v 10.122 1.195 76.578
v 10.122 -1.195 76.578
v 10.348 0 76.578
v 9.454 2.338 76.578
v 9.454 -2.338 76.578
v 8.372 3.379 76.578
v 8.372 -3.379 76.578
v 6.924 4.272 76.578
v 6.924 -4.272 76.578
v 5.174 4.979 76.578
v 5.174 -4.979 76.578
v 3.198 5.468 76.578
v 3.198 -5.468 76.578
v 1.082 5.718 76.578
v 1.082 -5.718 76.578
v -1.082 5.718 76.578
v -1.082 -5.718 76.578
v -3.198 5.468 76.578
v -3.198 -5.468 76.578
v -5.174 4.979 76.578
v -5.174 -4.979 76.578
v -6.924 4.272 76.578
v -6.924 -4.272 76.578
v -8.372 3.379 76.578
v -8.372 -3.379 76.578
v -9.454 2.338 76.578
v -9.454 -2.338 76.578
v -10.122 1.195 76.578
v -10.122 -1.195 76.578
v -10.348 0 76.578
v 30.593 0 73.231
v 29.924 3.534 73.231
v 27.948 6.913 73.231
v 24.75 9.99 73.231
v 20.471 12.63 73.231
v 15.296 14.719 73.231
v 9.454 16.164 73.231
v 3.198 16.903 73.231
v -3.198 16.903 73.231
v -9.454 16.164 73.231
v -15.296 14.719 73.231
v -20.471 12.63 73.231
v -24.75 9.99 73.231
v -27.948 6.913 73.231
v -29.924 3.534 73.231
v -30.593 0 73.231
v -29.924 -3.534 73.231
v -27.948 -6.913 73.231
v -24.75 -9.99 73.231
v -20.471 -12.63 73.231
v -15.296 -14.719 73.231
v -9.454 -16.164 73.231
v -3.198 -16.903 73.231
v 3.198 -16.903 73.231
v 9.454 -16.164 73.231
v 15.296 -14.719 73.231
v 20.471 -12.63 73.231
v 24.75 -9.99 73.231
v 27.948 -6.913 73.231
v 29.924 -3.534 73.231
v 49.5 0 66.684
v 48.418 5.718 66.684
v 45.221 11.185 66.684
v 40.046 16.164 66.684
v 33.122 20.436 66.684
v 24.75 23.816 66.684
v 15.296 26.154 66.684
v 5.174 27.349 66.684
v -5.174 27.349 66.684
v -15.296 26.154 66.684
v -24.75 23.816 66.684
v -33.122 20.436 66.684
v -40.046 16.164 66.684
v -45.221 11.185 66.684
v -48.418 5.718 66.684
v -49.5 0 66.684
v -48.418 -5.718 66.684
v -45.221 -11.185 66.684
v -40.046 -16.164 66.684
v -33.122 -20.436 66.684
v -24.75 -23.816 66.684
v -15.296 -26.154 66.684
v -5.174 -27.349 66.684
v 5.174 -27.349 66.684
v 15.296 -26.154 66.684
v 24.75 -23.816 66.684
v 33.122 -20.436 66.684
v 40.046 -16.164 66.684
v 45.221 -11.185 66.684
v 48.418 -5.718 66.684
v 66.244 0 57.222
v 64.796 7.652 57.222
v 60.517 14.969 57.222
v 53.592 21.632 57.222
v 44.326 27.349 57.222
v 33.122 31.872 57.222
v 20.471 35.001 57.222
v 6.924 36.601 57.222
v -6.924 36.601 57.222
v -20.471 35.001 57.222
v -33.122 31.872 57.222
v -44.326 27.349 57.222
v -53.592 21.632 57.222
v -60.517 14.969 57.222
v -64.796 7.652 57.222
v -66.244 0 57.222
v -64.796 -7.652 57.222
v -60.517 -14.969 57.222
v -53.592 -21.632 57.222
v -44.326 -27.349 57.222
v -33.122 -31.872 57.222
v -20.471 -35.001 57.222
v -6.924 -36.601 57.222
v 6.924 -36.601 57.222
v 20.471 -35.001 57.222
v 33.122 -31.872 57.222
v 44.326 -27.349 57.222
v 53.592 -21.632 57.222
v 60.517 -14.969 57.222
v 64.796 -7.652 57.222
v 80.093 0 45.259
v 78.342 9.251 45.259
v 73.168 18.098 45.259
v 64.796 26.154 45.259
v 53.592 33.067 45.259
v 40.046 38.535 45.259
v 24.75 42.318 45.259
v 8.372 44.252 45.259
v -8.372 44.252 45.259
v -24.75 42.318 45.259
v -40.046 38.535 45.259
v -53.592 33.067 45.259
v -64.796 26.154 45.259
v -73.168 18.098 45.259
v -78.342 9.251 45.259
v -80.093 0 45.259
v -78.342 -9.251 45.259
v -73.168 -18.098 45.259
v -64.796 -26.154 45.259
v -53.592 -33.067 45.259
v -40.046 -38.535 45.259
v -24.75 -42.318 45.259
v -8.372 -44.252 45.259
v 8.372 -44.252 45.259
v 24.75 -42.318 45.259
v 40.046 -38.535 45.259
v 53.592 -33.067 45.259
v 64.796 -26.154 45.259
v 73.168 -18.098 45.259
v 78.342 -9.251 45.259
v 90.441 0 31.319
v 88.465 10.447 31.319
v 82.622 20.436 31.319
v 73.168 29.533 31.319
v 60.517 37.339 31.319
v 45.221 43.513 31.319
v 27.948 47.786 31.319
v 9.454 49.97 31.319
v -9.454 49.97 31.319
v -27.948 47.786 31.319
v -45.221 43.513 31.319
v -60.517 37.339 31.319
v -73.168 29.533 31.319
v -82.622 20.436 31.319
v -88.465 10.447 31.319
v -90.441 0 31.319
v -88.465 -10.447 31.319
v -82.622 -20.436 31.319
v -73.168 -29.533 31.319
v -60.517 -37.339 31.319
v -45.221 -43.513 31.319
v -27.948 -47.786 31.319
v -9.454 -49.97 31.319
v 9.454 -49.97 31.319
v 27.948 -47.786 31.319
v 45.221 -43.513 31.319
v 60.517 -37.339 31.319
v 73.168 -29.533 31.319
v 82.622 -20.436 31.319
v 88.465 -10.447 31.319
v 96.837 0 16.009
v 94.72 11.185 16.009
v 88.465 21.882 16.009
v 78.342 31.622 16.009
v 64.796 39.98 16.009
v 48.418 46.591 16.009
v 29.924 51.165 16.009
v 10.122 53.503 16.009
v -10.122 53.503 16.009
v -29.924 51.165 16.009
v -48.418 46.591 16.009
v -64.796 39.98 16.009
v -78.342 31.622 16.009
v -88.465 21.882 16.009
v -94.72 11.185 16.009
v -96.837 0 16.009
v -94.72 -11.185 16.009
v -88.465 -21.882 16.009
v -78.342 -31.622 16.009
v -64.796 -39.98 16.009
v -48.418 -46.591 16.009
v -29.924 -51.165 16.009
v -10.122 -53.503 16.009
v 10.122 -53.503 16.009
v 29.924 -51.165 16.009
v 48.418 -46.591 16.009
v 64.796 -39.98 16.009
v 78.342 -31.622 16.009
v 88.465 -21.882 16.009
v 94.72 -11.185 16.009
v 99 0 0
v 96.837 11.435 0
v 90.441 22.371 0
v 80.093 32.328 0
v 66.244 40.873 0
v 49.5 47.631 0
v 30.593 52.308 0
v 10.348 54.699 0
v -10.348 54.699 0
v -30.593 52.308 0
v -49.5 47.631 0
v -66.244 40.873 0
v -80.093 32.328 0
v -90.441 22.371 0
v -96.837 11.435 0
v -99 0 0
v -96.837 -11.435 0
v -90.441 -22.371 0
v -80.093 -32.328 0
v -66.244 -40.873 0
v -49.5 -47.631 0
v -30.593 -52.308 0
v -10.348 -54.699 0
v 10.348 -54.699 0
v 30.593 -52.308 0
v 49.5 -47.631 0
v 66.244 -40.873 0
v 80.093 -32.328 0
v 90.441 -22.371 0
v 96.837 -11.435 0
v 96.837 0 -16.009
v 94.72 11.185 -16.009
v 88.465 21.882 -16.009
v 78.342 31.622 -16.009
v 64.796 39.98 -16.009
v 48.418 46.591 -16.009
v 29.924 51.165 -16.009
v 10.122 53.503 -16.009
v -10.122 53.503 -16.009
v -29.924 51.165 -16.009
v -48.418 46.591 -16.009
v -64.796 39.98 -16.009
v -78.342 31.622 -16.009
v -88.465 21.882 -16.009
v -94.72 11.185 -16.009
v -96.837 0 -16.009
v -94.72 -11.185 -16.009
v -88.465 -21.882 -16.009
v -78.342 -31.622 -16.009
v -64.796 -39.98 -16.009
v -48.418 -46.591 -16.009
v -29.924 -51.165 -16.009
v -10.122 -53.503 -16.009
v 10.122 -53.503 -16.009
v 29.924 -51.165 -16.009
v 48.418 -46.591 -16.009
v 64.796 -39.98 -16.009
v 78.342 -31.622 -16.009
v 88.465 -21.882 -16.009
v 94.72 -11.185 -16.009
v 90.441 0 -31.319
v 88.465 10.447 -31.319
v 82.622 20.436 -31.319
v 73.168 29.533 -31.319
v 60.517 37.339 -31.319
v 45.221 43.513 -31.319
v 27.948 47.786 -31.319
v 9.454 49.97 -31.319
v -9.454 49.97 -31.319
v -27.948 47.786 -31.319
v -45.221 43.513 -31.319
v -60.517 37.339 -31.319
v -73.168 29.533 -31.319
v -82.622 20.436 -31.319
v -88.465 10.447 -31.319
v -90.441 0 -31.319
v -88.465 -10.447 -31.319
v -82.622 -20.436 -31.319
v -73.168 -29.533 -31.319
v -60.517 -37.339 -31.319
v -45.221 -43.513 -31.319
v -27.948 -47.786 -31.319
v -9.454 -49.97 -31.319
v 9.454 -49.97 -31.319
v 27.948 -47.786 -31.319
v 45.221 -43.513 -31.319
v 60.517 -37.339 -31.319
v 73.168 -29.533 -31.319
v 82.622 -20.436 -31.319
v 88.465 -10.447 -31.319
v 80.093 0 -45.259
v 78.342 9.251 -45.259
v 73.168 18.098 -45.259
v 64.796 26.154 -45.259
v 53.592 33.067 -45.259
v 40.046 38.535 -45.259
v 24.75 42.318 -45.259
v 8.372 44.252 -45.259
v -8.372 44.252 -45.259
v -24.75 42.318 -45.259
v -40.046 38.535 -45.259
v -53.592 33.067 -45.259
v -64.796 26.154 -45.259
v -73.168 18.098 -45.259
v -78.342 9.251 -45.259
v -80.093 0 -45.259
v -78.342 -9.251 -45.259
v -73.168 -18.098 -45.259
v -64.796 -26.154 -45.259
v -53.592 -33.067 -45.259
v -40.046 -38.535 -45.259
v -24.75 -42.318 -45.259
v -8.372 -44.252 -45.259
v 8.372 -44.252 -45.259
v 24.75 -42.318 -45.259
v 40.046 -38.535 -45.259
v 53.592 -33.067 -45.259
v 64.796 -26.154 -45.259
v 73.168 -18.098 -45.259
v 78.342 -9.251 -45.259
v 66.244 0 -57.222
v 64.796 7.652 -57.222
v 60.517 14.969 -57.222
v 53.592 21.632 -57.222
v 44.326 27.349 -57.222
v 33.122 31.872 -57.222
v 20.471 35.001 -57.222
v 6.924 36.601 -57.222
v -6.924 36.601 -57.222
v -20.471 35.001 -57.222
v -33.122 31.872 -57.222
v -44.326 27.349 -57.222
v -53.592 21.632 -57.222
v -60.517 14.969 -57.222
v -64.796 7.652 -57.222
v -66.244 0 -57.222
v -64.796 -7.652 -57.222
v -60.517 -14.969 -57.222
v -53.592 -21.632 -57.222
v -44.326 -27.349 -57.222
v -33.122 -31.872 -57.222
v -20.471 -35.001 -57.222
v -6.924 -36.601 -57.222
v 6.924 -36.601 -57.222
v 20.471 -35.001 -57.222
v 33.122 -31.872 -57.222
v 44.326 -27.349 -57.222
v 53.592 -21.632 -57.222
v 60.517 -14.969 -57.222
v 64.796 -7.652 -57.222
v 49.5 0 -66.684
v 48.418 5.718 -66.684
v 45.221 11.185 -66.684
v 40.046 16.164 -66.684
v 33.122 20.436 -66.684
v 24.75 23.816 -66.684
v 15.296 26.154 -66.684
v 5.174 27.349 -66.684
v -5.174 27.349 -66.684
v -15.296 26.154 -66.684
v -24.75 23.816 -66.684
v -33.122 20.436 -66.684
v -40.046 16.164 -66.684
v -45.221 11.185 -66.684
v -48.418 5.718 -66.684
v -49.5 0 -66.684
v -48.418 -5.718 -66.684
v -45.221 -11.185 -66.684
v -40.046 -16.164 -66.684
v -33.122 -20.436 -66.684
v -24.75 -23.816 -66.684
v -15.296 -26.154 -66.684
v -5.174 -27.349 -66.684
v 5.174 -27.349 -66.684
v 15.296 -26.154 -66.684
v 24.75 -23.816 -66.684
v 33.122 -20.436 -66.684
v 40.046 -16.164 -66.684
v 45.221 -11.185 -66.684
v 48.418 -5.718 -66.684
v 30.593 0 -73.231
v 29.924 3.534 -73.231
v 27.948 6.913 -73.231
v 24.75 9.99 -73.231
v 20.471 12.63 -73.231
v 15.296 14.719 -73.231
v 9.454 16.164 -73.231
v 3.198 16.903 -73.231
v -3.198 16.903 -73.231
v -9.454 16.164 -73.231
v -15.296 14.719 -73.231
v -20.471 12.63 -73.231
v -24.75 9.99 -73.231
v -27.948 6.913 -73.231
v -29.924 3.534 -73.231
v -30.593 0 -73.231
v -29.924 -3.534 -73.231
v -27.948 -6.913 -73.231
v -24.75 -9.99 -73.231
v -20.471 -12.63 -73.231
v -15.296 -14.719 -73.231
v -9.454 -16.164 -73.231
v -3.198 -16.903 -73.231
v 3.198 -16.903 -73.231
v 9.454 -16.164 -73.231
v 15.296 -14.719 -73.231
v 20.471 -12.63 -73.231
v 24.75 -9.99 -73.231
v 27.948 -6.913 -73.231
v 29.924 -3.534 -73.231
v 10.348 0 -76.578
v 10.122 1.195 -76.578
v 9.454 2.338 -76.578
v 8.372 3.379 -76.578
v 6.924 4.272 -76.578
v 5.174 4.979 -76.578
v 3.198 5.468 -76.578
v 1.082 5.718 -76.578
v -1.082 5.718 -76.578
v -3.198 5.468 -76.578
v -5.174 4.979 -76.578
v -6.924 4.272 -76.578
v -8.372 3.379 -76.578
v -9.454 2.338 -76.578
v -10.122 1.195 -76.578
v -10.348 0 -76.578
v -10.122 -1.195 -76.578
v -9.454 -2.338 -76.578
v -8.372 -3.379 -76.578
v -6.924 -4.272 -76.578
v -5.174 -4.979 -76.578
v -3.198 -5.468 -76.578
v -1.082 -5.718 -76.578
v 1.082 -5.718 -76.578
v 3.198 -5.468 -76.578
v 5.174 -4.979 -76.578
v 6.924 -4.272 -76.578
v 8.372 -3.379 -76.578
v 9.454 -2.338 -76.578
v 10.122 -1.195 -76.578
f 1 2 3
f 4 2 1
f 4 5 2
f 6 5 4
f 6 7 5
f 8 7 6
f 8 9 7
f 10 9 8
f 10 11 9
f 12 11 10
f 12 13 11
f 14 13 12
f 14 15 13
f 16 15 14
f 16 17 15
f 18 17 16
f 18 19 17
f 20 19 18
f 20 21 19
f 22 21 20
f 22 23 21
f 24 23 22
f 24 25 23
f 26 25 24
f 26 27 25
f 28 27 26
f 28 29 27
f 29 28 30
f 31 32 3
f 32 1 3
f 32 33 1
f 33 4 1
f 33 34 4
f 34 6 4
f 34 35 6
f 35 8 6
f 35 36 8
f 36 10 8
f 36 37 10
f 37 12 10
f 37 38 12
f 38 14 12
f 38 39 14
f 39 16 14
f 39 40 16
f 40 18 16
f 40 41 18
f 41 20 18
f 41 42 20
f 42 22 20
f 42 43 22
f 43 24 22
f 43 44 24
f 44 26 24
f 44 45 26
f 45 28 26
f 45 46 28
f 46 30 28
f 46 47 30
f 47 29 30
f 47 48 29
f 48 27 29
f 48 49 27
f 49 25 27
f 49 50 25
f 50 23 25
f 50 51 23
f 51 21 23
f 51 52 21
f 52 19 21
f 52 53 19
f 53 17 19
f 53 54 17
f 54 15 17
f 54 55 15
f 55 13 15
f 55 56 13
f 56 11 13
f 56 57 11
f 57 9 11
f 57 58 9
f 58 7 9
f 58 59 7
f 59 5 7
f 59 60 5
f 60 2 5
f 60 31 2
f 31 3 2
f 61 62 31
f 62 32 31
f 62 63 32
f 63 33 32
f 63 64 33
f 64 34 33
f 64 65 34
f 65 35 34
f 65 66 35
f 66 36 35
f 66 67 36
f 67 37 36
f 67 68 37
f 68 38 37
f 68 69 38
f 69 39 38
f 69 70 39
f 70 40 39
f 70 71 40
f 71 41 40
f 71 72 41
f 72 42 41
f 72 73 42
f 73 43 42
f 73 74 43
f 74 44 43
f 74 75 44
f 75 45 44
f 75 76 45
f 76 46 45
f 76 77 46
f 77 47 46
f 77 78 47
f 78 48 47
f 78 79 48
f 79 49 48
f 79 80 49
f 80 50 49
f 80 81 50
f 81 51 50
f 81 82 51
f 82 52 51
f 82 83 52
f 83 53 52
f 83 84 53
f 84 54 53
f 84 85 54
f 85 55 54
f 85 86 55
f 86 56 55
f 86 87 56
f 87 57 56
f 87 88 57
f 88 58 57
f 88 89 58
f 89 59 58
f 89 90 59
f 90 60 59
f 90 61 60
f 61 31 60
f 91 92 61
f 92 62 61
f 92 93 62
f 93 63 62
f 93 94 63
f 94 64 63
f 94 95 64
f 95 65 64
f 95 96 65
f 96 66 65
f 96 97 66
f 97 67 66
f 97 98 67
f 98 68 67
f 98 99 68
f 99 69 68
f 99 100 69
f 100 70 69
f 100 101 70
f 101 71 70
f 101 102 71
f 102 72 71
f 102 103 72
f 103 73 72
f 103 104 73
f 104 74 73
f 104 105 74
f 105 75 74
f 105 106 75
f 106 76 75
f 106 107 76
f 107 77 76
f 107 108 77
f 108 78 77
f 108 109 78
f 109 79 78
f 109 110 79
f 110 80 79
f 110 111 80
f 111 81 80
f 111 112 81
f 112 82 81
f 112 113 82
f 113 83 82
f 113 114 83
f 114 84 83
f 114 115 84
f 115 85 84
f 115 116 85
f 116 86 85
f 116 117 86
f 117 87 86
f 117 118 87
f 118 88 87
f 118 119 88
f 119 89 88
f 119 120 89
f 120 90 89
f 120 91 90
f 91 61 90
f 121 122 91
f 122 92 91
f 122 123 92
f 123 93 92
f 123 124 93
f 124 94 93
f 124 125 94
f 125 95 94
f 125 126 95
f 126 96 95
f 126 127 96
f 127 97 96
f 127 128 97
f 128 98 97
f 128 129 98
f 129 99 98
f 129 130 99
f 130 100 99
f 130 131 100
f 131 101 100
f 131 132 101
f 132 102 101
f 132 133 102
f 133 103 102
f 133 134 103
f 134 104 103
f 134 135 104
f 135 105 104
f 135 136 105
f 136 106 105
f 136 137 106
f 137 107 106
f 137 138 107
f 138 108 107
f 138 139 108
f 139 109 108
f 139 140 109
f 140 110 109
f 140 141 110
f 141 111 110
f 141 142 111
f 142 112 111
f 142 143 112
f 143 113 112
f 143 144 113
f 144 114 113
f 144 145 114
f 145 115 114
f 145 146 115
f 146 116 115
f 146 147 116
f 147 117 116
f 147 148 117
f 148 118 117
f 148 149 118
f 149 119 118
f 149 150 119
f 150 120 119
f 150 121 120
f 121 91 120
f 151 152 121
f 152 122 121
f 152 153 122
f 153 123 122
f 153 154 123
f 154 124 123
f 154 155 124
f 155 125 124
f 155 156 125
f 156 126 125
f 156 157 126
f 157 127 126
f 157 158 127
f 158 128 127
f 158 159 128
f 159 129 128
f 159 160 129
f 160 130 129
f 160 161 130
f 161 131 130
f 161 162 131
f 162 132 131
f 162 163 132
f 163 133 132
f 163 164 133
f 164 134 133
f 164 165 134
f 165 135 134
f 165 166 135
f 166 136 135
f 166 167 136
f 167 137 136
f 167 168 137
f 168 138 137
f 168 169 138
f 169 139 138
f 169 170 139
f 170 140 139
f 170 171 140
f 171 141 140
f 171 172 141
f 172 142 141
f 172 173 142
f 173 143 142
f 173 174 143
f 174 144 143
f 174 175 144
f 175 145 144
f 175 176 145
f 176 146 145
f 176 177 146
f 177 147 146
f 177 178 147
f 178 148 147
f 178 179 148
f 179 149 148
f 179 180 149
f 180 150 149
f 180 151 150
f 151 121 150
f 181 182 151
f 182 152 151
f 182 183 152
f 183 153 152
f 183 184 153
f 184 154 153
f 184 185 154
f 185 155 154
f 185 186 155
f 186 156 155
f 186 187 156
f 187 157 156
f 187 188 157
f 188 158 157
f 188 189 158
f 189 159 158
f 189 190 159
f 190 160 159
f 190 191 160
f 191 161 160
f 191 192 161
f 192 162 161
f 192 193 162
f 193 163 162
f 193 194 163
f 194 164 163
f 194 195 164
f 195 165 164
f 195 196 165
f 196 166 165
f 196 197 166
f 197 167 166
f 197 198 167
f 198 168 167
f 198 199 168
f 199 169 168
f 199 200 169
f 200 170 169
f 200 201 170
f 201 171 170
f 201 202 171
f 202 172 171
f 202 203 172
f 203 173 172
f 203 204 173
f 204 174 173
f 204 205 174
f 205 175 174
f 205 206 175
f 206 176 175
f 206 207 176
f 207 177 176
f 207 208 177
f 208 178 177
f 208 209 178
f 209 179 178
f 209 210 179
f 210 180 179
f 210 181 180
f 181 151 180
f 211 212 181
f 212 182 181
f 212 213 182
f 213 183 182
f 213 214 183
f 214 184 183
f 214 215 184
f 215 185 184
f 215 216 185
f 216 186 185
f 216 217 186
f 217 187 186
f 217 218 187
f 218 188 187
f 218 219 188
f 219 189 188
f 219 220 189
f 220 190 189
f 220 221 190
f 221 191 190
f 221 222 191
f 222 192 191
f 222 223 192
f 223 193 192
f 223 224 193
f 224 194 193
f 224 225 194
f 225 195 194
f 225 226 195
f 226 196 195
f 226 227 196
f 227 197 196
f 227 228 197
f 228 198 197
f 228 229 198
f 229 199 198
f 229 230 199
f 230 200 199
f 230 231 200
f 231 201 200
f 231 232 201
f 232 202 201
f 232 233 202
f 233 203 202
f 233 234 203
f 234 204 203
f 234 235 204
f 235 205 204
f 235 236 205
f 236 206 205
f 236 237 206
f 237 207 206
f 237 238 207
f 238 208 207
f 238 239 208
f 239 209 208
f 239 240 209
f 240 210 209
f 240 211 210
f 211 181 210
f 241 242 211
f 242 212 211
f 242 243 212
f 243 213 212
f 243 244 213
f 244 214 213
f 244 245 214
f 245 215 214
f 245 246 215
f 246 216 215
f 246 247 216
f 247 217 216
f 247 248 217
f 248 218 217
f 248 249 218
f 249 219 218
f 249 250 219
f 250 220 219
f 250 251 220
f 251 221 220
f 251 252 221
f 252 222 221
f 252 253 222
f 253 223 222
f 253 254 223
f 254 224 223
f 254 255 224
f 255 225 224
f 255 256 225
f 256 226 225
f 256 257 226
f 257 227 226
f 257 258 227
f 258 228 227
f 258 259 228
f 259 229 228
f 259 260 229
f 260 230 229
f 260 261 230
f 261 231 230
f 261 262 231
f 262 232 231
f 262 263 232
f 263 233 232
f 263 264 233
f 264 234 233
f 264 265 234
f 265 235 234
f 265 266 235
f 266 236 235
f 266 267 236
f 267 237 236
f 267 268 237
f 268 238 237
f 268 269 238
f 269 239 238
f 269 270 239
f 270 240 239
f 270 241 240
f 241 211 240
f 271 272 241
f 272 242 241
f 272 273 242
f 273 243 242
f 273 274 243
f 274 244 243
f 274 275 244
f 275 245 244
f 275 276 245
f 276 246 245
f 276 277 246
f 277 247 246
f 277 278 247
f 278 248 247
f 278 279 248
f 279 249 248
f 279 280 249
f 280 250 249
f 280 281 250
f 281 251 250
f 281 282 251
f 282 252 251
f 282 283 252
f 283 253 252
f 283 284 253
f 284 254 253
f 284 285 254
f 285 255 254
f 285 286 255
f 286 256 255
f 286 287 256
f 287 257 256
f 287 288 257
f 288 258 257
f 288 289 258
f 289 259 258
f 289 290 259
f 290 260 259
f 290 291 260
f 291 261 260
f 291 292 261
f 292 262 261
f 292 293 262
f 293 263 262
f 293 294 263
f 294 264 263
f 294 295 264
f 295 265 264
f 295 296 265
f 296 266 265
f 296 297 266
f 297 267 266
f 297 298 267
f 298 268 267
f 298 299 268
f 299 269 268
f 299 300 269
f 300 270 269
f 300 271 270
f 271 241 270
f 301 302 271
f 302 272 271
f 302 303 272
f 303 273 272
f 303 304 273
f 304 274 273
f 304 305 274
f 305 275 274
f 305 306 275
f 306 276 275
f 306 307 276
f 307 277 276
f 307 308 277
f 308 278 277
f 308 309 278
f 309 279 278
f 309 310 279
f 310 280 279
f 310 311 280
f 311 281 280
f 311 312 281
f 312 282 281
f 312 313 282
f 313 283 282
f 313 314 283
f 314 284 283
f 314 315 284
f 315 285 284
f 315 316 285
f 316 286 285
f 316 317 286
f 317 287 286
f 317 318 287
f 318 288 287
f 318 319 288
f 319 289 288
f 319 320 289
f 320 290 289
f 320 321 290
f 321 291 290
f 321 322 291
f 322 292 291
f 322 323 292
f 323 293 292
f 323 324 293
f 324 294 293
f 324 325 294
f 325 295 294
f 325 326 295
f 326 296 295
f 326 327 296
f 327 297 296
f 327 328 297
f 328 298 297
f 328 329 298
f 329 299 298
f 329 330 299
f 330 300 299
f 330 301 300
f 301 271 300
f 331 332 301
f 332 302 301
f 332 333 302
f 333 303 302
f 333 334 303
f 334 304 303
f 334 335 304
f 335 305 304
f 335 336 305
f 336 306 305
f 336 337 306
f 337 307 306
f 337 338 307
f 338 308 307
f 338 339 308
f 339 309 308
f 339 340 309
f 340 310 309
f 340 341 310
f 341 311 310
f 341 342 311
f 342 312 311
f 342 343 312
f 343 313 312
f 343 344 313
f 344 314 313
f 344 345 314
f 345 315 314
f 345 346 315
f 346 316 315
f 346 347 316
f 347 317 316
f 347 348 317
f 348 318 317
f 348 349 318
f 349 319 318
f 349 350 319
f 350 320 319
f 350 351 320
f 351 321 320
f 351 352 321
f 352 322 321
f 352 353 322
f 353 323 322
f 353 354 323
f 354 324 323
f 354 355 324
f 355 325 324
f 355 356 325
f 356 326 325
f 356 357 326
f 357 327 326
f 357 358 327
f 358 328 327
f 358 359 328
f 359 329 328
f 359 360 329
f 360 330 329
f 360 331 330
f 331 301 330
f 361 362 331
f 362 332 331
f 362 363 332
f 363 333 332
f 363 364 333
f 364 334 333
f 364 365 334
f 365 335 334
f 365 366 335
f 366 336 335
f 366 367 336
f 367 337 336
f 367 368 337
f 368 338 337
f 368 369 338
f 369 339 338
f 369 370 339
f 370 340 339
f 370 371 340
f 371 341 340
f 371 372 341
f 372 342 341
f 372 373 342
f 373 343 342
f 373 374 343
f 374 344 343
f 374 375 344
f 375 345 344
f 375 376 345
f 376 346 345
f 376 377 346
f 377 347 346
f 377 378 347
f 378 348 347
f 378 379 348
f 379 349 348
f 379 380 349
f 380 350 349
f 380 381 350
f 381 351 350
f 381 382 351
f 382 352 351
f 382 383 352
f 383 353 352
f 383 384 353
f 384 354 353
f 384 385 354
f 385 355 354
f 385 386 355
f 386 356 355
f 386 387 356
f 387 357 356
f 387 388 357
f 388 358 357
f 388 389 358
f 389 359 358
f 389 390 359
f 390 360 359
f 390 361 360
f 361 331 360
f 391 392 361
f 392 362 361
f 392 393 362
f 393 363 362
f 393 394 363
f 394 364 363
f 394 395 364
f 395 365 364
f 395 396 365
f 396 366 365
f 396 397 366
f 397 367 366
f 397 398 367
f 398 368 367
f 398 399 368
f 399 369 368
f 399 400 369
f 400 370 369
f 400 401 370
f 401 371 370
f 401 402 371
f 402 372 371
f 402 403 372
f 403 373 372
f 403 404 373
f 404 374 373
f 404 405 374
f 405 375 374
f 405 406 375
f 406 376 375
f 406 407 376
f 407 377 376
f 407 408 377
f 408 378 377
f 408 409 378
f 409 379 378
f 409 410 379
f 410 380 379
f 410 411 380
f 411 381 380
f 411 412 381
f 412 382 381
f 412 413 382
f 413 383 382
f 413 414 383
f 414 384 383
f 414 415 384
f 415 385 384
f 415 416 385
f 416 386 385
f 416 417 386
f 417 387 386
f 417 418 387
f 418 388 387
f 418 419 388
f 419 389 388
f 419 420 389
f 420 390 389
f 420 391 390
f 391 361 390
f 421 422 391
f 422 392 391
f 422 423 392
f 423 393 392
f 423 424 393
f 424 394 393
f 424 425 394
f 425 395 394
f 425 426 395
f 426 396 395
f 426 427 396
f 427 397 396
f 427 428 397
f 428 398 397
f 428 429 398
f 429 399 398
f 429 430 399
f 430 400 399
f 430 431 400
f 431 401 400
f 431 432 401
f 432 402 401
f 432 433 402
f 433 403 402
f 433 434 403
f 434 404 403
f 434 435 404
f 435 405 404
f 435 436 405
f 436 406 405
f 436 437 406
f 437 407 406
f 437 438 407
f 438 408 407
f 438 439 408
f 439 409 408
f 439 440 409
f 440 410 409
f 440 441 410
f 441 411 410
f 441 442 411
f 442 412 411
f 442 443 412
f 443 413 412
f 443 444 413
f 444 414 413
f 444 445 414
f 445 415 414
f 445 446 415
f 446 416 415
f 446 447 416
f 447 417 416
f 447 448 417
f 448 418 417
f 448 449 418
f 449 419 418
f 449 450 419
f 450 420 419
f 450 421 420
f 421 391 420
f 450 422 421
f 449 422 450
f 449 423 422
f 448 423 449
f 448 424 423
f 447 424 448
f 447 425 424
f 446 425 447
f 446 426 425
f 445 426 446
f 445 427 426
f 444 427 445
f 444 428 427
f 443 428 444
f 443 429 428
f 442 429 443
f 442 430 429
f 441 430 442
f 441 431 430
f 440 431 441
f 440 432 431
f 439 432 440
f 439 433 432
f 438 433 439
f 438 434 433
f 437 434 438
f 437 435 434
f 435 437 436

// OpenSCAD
// Generated by SolidPython 1.0.1 on 2020-07-29 00:46:48


scale(v = [9, 5, 7]) {
	sphere(r = 11);
}
/***********************************************
*********      SolidPython code:      **********
************************************************
 
# import packages: SolidPython
from solid import *
from solid.utils import *
from itertools import chain, combinations, permutations


class Resize:

    def __init__(self, scad_file):
        self.scad_file = scad_file
        #self.scad_file = import_scad(scad_file)
        # cone/cylinder param:
        self.r1 = 0
        self.r2 = 0
        self.h = 0
        # rectangular prism param:
        self.w = 0
        self.l = 0
        # ellipse param:
        self.r = 0

    # import OpenScad code (file name corresponds to shape)


    # classify shape + parameters
    def assign(self, param1, param2, param3):
        if self.scad_file == 'cone.scad':
            self.r1 = param1
            self.r2 = param2
            self.h = param3
        elif self.scad_file == 'cylinder.scad':
            self.r1 = param1
            self.r2 = param2
            self.h = param3
        elif self.scad_file == 'rectangularPrism.scad':
            self.h = param1
            self.l = param2
            self.w = param3
        else:
            self.r = param1
            self.h = param2

    # resize parameters
    def iterate(self):
        x = range(3, 20, 2)
        i = 1
        if self.scad_file == 'cone.scad':
            tempList = list(permutations(x, 2))
            for temp in tempList:
                param1 = temp[0]
                param2 = temp[1]
                filepath = 'produced_scad_files/' + 'cone' + str(param1) + '_' + str(param2) + '_' + '.scad'
                scad_render_to_file(cylinder(h=param1, r1=param2, r2=0), filepath)

        elif self.scad_file == 'cylinder.scad':
            tempList = list(permutations(x, 3))
            for temp in tempList:
                param1 = temp[0]
                param2 = temp[1]
                filepath = 'produced_scad_files/' + 'cylinder' + str(param1) + '_' + str(param2) + '_' + '.scad'
                scad_render_to_file(cylinder(h=param1, r1=param2, r2=param2), filepath)

        elif self.scad_file == 'rectangularPrism.scad':
            tempList = list(permutations(x, 3))
            for temp in tempList:
                param1 = temp[0]
                param2 = temp[1]
                param3 = temp[2]
                filepath = 'produced_scad_files/' + 'rectangularPrism' + str(param1) + '_' + str(param2) + '_' + str(
                    param3) + '.scad'
                scad_render_to_file(cube(size=(param1, param2, param3)), filepath)

        elif self.scad_file == 'ellipse.scad':
            tempList = list(permutations(x, 4))
            for temp in tempList:
                param1 = temp[0]
                param2 = temp[1]
                param3 = temp[2]
                param4 = temp[3]
                filepath = 'produced_scad_files/' + 'ellipse' + str(param1) + '_' + str(param2) + '_' + str(param3) + '_' + str(param4) + '.scad'
                scad_render_to_file(scale([param1, param2, param3])(sphere(r=param4)), filepath)

    def render_to_scadfile(self):
        scad_render_to_file(scad, 'example.scad') 
 
************************************************/
